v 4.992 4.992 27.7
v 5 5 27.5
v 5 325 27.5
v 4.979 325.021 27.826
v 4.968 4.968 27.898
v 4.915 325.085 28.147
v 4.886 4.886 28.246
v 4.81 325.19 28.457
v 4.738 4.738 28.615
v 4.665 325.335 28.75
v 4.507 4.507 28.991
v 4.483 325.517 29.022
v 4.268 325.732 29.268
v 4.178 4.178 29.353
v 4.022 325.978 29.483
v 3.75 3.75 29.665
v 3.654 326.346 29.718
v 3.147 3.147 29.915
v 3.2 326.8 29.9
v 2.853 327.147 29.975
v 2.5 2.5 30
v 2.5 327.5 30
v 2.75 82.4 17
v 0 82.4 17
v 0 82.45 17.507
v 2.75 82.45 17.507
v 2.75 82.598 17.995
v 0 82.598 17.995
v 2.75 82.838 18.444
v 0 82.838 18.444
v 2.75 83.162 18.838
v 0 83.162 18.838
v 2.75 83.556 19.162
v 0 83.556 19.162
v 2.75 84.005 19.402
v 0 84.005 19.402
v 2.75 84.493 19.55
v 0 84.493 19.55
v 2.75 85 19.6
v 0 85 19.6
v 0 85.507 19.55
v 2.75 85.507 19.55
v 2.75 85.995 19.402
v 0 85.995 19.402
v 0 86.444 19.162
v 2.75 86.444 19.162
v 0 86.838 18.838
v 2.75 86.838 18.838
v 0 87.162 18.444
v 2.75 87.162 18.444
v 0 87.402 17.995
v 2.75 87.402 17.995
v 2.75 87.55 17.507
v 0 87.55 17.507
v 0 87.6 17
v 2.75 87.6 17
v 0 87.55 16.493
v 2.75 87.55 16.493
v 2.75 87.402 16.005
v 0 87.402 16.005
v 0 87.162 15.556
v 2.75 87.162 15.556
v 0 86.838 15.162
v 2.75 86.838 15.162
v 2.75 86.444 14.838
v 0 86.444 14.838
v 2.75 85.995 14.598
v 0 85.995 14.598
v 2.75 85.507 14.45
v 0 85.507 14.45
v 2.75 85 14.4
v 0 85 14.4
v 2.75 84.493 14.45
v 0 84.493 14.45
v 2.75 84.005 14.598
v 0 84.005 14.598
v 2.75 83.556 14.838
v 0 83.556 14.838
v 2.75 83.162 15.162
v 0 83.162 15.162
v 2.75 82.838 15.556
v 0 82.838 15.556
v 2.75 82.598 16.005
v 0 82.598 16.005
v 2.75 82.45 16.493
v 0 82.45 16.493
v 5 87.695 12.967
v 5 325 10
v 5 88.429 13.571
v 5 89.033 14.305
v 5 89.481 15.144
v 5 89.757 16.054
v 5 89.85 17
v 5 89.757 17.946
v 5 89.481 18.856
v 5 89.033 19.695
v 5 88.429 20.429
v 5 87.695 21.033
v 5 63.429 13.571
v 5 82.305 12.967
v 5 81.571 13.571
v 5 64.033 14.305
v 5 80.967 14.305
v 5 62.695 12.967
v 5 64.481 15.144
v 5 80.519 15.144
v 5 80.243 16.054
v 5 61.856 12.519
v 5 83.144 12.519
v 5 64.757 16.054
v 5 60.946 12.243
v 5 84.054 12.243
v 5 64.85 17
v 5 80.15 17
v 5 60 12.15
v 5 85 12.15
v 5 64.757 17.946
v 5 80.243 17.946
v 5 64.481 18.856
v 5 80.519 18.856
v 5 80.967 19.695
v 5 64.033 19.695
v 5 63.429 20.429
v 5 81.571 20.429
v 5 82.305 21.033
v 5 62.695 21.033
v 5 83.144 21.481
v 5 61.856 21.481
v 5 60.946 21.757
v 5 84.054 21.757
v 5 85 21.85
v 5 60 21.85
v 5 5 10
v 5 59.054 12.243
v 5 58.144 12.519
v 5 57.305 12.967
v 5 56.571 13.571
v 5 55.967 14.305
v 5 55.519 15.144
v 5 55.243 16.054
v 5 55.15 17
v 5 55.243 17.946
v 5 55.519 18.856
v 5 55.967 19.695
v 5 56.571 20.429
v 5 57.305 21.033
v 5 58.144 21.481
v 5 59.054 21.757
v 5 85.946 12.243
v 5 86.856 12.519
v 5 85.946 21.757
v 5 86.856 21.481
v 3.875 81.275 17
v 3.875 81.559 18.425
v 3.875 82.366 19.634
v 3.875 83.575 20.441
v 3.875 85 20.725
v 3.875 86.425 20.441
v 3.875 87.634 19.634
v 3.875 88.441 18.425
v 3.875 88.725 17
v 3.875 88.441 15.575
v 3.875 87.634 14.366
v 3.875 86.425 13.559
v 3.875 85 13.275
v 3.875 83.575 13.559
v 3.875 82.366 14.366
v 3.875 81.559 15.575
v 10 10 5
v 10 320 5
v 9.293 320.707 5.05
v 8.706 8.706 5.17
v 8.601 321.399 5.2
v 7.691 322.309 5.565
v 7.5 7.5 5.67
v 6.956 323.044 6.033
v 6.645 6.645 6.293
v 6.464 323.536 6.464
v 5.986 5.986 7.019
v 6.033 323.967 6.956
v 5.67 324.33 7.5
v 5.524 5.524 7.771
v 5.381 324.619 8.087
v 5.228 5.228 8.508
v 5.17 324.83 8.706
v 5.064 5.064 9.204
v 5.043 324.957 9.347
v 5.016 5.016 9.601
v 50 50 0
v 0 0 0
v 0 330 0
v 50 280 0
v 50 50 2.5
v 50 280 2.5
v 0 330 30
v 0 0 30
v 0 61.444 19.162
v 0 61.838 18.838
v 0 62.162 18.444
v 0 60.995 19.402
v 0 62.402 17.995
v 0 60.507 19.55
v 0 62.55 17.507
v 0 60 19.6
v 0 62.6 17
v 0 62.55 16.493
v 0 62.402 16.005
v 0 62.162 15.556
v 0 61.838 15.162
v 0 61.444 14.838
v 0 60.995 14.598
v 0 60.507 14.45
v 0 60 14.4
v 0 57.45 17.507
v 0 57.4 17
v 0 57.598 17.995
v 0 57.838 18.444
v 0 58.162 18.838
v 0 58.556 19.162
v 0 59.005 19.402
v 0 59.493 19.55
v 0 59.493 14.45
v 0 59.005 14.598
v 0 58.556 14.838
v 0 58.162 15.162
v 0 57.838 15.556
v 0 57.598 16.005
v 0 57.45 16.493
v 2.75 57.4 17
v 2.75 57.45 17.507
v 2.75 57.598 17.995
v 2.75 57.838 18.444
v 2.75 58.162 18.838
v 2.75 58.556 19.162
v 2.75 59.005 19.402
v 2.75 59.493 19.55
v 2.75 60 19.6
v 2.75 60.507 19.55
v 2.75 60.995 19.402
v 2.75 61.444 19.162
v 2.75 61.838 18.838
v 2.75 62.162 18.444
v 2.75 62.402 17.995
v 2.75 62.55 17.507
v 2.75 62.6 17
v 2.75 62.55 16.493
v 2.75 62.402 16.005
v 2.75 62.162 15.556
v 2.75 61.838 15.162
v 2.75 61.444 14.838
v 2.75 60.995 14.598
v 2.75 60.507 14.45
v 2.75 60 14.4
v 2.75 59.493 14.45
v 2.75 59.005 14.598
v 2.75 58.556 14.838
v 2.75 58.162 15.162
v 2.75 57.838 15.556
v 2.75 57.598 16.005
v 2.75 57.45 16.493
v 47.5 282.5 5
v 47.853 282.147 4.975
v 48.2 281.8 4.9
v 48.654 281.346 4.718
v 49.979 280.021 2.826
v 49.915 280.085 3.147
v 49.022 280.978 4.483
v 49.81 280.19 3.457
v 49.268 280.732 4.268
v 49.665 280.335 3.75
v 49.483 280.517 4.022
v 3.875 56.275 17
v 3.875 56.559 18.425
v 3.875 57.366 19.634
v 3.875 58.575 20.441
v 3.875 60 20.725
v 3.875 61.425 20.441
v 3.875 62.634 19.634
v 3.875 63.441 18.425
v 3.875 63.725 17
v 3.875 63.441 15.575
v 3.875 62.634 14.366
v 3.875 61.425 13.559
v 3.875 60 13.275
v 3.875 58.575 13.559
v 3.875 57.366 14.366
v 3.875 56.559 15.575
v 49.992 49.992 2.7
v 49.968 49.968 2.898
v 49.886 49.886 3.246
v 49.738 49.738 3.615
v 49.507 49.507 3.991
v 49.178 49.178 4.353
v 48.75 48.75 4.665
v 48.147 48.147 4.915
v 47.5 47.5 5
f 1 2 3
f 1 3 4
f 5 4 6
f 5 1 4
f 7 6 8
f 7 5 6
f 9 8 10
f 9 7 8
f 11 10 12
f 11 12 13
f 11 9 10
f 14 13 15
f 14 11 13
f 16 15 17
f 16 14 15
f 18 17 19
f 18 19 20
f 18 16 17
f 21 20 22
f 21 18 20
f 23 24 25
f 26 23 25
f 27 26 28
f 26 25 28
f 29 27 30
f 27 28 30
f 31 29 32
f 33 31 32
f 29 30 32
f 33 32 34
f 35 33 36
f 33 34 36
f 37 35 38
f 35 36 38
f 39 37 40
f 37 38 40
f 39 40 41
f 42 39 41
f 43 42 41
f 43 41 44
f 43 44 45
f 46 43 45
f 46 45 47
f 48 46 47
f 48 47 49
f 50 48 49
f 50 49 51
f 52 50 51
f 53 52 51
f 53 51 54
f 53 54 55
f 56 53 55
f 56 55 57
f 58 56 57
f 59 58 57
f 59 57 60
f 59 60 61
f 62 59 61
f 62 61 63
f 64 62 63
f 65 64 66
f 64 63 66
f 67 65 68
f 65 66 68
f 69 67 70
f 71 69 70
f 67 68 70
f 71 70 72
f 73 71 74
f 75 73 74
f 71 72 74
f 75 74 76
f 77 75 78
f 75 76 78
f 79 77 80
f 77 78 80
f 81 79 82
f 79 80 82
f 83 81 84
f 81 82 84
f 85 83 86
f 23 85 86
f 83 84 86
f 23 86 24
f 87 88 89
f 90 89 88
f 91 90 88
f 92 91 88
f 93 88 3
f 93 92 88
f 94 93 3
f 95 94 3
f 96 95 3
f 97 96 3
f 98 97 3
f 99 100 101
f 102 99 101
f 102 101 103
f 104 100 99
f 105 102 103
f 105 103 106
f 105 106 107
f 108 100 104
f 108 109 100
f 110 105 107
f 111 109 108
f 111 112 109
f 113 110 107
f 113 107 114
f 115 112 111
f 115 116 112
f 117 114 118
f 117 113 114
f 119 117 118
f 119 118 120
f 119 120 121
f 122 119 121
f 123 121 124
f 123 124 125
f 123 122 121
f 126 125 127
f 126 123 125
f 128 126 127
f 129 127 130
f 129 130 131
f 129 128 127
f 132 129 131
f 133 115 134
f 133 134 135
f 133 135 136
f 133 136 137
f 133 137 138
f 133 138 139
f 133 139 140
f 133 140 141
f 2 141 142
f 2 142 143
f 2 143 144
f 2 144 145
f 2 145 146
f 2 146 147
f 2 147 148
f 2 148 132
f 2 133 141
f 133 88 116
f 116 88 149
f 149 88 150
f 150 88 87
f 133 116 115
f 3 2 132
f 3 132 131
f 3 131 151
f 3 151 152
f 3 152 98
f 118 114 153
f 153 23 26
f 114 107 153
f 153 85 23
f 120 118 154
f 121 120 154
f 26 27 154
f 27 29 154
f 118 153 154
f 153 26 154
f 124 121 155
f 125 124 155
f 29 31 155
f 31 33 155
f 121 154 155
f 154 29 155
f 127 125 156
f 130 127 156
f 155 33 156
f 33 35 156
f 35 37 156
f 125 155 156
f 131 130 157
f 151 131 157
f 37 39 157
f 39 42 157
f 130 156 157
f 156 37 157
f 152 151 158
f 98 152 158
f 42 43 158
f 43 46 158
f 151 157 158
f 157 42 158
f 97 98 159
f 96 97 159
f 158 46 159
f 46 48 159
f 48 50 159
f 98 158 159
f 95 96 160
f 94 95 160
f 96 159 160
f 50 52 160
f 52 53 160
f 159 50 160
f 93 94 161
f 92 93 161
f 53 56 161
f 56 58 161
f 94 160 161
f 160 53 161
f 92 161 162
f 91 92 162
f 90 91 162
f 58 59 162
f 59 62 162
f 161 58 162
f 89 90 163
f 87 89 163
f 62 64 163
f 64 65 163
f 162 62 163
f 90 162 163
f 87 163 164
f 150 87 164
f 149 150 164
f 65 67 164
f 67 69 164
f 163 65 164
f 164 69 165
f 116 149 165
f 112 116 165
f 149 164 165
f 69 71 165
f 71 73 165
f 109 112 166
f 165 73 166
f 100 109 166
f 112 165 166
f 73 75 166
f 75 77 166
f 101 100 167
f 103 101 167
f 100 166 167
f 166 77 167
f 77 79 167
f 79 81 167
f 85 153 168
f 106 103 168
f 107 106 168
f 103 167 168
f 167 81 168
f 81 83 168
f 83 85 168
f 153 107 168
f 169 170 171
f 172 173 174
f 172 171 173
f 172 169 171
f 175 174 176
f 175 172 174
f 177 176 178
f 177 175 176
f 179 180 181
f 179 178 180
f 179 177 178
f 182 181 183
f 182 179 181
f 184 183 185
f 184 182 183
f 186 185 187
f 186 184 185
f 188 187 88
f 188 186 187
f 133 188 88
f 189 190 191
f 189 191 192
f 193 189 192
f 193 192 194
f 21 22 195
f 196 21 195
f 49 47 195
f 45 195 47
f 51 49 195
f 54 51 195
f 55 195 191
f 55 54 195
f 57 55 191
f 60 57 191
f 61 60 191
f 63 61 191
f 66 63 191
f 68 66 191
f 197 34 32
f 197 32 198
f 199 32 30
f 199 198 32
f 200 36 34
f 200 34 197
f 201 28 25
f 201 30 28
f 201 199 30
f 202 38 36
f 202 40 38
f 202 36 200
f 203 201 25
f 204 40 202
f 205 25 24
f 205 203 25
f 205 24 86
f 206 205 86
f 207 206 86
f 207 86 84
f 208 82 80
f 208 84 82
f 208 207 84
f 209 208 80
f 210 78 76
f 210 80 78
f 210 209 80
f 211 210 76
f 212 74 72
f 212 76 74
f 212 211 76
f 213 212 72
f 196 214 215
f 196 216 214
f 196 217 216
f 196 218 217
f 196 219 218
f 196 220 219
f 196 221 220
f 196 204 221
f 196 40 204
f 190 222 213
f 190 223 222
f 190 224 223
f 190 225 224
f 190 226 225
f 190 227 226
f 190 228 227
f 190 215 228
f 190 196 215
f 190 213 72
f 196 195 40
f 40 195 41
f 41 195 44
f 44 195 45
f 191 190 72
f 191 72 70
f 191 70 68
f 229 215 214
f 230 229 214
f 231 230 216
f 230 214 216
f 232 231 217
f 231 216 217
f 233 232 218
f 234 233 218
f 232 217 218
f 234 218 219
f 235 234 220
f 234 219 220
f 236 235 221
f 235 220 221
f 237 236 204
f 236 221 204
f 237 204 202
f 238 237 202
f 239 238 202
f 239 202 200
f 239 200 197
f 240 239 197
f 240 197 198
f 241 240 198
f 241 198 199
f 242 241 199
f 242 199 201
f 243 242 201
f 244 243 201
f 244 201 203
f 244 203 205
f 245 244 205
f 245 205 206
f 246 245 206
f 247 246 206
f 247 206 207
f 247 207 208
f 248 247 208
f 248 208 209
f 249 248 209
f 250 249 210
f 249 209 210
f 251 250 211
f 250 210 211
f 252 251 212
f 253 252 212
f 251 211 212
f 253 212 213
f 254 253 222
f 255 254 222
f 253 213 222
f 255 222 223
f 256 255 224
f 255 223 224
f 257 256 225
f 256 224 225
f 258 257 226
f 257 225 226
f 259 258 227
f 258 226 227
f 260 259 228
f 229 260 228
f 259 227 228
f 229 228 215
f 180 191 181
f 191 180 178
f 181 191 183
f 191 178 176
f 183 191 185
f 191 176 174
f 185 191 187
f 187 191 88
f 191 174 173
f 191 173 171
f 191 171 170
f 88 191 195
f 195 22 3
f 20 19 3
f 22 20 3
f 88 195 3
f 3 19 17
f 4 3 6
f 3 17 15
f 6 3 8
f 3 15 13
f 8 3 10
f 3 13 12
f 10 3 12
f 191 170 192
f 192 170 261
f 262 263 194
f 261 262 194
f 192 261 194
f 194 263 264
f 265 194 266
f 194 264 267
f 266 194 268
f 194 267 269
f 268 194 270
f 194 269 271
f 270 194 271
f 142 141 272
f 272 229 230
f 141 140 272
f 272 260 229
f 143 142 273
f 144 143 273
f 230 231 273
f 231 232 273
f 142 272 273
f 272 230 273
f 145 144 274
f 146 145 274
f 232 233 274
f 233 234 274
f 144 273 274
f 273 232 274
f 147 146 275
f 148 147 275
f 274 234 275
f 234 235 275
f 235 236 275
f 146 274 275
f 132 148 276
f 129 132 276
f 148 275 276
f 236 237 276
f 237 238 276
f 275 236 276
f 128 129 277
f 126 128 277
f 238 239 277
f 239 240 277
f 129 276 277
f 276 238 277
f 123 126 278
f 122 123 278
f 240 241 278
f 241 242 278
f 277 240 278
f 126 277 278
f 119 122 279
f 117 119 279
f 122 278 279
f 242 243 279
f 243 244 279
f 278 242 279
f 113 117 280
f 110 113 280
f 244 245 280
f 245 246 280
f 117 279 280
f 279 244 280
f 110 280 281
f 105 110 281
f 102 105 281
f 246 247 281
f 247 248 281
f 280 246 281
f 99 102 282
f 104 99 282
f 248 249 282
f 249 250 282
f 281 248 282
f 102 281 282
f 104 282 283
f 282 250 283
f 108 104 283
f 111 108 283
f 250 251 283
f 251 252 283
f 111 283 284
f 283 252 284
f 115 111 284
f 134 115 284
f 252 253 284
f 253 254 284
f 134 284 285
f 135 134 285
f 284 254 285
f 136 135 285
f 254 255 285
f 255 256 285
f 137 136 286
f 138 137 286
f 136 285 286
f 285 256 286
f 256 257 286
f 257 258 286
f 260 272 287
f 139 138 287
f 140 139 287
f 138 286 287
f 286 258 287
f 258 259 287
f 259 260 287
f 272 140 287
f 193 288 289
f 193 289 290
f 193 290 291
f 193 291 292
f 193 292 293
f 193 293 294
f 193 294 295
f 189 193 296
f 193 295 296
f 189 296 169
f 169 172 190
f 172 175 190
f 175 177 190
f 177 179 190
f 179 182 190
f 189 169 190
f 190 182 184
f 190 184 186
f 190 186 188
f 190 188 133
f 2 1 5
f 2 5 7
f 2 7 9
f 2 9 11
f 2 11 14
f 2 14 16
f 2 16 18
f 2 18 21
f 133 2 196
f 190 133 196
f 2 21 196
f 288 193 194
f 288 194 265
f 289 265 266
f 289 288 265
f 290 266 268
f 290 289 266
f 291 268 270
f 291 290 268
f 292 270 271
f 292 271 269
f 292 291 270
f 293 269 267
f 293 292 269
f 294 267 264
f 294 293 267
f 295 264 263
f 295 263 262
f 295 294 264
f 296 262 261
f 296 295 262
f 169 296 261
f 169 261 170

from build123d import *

# Parameters (mm, degrees)
F1_DEPTH = 330
F3_DEPTH = 30.001
F4_R     = 2.6
F5_DEPTH = 50.001
F6_SIZE  = 2.25


with BuildPart() as f1:
    # F0 (on Front) → F1 (new body)
    with BuildSketch(Plane.XZ):
        with BuildLine():
            Line((0, 5), (0, 0))
            Line((0, 0), (5, 0))
            Line((5, 0), (50, 0))
            Line((50, 0), (50, 2.5))
            ThreePointArc((50, 2.5), (49.267766953, 4.267766953), (47.5, 5))
            Line((47.5, 5), (10, 5))
            ThreePointArc((10, 5), (6.4644660941, 6.4644660941), (5, 10))
            Line((5, 10), (5, 27.5))
            ThreePointArc((5, 27.5), (4.267766953, 29.267766953), (2.5, 30))
            Line((2.5, 30), (0, 30))
            Line((0, 30), (0, 5))
        make_face()
    extrude(amount=-F1_DEPTH)

    # F2 (on face) → F3 (cut, through all)
    with BuildSketch(Plane.XY.offset(30)):
        Polygon((2.5, 330), (2.5, 327.5), (72.6712993005, 257.3287006995), (72.6712993005, 330), align=None)
        Polygon((72.6712993005, 72.6712993005), (2.5, 2.5), (2.5, 0), (72.6712993005, 0), align=None)
        Polygon((2.5, 330), (0, 330), (2.5, 327.5), align=None)
        Polygon((2.5, 2.5), (0, 0), (2.5, 0), align=None)
    extrude(amount=-F3_DEPTH, mode=Mode.SUBTRACT)

    # F4 (on face) → F5 (cut, through all)
    with BuildSketch(Plane(origin=(0, 0, 0), x_dir=(0, -1, 0), z_dir=(-1, 0, 0))):
        with Locations((-85, 17)):
            Circle(F4_R)
        with Locations((-60, 17)):
            Circle(F4_R)
    extrude(amount=-F5_DEPTH, mode=Mode.SUBTRACT)

    # F6
    f6_edges = [f1.edges().sort_by_distance(p)[0] for p in [
        (5, 62.6, 17),
        (5, 87.6, 17),
    ]]
    chamfer(f6_edges, length=F6_SIZE)


solid = f1.part
